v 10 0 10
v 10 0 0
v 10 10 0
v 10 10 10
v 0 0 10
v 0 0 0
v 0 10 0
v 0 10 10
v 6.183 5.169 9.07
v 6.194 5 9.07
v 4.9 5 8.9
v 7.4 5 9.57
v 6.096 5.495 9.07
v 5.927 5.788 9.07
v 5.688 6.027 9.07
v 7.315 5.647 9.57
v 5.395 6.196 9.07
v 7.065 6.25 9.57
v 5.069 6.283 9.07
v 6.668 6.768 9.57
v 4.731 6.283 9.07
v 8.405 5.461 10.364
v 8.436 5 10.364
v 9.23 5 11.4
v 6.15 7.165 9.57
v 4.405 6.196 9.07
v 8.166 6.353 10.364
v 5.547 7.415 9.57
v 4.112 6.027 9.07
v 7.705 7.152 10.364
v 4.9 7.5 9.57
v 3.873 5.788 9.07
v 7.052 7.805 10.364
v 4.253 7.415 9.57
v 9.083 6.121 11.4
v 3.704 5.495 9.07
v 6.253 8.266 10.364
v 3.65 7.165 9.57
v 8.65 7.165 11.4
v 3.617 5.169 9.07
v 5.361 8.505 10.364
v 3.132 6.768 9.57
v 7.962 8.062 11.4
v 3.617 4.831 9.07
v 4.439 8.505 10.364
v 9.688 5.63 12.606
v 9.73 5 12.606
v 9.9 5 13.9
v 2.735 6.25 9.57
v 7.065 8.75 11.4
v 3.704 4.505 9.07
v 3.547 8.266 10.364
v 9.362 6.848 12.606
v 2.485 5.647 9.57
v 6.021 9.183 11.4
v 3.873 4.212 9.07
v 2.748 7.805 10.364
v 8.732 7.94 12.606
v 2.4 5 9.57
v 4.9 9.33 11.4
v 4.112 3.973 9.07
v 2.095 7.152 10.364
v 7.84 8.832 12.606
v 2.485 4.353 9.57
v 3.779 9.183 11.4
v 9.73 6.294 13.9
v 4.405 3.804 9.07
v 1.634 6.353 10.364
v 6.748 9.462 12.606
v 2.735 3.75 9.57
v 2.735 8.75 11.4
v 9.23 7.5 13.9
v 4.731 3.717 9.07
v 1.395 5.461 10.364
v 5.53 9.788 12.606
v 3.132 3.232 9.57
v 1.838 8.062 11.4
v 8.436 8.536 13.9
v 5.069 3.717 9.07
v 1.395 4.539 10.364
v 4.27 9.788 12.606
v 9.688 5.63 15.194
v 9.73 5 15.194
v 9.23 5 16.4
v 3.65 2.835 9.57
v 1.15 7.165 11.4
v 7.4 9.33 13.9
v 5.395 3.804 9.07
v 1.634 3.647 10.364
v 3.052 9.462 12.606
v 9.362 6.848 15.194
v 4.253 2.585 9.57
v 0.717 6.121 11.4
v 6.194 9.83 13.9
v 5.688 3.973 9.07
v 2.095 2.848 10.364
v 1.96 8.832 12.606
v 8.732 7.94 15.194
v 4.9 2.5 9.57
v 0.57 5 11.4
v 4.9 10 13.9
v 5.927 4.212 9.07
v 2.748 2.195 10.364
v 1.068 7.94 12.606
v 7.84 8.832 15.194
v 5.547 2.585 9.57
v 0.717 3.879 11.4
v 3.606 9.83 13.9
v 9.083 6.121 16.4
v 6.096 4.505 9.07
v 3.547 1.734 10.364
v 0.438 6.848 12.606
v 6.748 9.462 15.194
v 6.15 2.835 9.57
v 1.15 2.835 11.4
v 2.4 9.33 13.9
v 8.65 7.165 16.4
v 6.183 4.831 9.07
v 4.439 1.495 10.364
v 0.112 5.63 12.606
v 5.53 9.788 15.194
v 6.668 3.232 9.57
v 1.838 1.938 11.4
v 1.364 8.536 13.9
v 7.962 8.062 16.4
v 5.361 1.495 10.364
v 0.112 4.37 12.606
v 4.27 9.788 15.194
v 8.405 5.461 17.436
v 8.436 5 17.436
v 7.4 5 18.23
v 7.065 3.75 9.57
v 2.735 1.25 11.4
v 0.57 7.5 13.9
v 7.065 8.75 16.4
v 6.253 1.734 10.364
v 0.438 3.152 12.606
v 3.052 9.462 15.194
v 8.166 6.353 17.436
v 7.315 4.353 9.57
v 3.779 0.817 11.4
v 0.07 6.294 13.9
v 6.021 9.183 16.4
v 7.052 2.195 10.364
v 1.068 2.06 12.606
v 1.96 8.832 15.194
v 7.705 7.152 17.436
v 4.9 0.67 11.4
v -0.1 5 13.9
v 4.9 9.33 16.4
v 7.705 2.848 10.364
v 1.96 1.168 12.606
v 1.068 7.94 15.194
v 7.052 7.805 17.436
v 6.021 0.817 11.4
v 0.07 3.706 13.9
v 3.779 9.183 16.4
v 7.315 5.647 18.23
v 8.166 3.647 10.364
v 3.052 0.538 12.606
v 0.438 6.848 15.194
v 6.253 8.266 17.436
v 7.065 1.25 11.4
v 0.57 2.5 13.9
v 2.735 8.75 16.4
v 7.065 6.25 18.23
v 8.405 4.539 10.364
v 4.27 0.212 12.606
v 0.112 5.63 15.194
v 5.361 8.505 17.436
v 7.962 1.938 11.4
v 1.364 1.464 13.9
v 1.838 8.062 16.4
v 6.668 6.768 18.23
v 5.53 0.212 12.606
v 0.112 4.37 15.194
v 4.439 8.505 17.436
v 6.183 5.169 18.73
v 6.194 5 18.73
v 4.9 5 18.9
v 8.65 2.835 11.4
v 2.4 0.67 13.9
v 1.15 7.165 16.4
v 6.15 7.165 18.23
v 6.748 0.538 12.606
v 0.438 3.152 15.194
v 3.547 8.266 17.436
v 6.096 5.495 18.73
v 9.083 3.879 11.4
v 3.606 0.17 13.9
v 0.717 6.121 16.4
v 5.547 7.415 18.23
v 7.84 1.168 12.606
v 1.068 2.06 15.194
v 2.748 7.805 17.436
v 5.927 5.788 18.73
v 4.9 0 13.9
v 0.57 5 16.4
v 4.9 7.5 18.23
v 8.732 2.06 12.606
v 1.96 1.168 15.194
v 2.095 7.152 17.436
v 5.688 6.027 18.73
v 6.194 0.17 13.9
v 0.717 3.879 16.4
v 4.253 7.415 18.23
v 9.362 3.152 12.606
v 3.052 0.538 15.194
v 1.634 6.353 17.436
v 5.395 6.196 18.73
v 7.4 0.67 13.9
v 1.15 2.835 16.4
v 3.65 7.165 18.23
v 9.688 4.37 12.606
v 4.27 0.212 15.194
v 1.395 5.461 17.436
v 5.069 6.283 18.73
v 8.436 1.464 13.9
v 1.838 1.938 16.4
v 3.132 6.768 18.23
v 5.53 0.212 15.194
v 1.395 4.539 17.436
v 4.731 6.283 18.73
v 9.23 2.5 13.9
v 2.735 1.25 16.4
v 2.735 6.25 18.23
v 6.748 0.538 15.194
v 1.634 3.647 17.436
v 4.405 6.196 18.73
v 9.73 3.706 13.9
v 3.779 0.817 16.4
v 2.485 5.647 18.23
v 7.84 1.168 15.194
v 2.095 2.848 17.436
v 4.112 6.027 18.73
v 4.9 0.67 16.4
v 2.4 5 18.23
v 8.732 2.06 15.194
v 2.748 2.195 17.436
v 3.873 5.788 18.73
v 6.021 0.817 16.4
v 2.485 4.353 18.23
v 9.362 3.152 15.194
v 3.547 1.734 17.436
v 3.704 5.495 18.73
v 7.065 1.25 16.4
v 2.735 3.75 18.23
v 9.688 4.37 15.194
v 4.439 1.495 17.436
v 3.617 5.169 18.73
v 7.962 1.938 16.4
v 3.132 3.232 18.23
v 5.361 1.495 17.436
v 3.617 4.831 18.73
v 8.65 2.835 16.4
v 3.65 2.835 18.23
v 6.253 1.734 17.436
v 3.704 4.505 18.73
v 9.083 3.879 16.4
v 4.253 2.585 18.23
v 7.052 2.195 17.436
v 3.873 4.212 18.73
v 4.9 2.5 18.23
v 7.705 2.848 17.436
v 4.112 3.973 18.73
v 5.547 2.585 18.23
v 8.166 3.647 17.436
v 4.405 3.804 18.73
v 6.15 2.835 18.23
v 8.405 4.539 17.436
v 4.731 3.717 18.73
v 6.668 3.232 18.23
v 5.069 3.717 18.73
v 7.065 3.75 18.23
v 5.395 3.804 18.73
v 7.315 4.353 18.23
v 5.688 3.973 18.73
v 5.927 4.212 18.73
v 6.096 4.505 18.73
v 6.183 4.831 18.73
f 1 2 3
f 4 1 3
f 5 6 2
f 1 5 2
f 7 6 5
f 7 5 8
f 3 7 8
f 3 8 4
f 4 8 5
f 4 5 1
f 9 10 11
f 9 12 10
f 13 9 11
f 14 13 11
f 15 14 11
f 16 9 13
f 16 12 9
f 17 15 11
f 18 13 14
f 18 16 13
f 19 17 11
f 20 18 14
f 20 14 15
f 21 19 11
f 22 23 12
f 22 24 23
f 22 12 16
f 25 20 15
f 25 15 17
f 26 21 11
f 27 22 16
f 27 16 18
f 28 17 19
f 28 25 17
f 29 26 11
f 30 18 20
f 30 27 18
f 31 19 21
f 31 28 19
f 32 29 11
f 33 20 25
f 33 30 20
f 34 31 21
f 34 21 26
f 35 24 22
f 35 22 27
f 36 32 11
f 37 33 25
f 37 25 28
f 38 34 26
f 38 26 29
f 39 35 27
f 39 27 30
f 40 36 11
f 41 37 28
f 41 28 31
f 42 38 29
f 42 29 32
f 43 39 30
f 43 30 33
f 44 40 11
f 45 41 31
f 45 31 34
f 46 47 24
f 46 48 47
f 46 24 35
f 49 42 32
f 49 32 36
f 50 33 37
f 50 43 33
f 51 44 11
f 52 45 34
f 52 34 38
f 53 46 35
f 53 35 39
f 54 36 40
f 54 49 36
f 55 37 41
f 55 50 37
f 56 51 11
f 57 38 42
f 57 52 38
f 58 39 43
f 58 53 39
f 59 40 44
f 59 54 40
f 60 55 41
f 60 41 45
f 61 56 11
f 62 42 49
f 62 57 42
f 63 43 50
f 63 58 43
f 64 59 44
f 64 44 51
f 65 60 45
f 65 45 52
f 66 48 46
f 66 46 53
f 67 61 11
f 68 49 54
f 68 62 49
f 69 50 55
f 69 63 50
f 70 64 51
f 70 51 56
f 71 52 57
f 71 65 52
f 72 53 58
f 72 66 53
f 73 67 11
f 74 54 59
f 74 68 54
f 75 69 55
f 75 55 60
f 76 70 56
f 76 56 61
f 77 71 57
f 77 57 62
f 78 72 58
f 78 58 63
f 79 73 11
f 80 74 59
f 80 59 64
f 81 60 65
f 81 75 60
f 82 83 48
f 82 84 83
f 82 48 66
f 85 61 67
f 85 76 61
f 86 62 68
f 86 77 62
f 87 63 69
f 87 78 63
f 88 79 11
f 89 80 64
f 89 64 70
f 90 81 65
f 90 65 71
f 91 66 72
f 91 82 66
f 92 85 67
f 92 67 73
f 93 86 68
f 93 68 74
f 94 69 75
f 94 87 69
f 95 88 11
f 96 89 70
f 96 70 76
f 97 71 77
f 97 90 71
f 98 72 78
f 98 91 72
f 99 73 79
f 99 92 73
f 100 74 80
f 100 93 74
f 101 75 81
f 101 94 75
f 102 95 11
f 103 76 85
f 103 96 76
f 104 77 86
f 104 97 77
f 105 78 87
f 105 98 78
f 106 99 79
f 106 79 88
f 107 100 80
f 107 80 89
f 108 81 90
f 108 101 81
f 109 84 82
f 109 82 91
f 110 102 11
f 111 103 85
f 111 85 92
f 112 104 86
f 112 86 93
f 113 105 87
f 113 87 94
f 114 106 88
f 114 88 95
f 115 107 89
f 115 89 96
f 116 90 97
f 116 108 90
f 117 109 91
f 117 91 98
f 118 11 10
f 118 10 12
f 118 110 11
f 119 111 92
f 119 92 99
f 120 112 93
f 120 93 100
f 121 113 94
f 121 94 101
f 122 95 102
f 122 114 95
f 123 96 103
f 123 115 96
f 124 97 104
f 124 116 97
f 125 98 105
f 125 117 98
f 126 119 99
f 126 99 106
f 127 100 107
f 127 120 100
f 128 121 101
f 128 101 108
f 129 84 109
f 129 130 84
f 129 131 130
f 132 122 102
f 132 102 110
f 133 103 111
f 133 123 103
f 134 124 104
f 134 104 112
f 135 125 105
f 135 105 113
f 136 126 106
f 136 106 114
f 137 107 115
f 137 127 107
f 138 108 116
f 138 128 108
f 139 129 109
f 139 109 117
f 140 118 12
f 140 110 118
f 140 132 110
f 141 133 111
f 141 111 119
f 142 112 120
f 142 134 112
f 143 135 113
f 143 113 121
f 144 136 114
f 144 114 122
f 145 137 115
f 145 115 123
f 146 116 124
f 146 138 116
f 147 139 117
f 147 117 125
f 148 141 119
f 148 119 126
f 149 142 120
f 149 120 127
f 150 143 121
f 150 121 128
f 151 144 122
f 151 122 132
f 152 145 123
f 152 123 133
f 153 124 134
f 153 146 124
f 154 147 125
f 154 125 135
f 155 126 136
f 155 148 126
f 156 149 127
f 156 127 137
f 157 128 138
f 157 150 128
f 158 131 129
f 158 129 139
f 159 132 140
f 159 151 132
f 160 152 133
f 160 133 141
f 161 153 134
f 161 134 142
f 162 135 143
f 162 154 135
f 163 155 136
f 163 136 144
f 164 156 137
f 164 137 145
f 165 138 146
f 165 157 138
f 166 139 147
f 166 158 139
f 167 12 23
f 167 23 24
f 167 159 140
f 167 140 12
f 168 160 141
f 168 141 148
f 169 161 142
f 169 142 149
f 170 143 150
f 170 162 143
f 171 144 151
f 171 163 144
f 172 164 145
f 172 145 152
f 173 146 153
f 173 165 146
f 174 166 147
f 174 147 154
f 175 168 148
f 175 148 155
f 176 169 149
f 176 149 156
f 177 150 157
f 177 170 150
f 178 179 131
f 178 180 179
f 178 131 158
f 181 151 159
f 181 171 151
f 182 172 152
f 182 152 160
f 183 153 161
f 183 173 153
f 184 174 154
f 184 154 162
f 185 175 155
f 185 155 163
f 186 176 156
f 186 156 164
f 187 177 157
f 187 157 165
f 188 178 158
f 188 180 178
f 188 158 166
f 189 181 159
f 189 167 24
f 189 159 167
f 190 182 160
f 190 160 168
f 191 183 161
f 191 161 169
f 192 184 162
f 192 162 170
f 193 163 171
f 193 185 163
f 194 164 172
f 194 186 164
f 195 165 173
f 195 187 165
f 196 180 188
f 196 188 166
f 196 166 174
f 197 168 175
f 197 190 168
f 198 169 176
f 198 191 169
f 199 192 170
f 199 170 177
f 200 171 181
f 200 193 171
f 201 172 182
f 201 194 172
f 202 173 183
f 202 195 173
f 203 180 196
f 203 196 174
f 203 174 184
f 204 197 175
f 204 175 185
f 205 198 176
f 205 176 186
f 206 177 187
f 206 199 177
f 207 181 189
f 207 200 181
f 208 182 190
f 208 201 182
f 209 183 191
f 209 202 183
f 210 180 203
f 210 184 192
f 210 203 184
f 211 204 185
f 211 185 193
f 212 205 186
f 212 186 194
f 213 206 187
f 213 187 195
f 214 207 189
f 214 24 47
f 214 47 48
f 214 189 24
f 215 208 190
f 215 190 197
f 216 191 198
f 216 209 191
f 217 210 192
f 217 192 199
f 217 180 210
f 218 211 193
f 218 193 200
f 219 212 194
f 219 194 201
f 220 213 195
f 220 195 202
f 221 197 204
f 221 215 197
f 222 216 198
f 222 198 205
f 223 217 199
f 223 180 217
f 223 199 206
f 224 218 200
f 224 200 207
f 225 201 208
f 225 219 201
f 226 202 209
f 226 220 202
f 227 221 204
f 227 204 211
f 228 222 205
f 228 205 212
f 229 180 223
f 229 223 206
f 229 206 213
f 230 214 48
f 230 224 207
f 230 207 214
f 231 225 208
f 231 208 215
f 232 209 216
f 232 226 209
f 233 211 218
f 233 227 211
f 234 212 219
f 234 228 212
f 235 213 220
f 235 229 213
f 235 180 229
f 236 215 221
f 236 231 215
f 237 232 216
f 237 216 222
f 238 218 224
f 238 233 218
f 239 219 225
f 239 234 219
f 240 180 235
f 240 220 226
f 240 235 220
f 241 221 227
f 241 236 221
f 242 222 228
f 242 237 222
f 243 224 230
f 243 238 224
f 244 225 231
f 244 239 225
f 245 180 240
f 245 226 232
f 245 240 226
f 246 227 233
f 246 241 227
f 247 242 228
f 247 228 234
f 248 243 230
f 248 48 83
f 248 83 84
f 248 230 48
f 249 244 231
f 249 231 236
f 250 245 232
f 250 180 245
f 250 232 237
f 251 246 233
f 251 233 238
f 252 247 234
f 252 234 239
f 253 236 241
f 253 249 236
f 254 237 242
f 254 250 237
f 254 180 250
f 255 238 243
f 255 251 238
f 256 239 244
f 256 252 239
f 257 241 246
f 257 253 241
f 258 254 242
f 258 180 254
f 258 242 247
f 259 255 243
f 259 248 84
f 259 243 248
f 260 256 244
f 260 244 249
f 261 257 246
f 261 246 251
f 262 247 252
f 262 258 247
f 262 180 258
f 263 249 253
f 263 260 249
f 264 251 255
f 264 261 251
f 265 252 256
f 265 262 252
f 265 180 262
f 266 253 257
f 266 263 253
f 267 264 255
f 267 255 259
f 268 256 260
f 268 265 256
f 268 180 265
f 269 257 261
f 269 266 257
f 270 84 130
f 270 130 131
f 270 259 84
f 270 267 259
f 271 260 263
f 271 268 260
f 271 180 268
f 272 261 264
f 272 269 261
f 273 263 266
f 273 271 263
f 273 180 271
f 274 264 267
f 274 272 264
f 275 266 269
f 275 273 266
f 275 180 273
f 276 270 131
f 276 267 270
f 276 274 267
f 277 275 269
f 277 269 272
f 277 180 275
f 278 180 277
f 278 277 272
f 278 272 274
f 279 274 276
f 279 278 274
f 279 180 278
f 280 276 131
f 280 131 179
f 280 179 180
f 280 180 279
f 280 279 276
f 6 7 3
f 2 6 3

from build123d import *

# Parameters (mm, degrees)
BOX_W     = 10
BOX_H     = 10
BOX_DEPTH = 10


with BuildPart() as cube:
    # Box → Box (new body)
    with BuildSketch(Plane.XY):
        with Locations((5, 5)):
            Rectangle(BOX_W, BOX_H)
    extrude(amount=BOX_DEPTH)


with BuildPart() as sphere:
    # Sphere → Sphere (revolve)
    with BuildSketch(Plane(origin=(4.9, 5, 13.9), x_dir=(1, 0, 0), z_dir=(0, -1, 0))):
        with BuildLine():
            ThreePointArc((0, -5), (5, 0), (0, 5))
            Line((0, 5), (0, -5))
        make_face()
    revolve(axis=Axis((4.9, 5, 13.9), (0, 0, 1)))


solid = Compound([cube.part, sphere.part])
